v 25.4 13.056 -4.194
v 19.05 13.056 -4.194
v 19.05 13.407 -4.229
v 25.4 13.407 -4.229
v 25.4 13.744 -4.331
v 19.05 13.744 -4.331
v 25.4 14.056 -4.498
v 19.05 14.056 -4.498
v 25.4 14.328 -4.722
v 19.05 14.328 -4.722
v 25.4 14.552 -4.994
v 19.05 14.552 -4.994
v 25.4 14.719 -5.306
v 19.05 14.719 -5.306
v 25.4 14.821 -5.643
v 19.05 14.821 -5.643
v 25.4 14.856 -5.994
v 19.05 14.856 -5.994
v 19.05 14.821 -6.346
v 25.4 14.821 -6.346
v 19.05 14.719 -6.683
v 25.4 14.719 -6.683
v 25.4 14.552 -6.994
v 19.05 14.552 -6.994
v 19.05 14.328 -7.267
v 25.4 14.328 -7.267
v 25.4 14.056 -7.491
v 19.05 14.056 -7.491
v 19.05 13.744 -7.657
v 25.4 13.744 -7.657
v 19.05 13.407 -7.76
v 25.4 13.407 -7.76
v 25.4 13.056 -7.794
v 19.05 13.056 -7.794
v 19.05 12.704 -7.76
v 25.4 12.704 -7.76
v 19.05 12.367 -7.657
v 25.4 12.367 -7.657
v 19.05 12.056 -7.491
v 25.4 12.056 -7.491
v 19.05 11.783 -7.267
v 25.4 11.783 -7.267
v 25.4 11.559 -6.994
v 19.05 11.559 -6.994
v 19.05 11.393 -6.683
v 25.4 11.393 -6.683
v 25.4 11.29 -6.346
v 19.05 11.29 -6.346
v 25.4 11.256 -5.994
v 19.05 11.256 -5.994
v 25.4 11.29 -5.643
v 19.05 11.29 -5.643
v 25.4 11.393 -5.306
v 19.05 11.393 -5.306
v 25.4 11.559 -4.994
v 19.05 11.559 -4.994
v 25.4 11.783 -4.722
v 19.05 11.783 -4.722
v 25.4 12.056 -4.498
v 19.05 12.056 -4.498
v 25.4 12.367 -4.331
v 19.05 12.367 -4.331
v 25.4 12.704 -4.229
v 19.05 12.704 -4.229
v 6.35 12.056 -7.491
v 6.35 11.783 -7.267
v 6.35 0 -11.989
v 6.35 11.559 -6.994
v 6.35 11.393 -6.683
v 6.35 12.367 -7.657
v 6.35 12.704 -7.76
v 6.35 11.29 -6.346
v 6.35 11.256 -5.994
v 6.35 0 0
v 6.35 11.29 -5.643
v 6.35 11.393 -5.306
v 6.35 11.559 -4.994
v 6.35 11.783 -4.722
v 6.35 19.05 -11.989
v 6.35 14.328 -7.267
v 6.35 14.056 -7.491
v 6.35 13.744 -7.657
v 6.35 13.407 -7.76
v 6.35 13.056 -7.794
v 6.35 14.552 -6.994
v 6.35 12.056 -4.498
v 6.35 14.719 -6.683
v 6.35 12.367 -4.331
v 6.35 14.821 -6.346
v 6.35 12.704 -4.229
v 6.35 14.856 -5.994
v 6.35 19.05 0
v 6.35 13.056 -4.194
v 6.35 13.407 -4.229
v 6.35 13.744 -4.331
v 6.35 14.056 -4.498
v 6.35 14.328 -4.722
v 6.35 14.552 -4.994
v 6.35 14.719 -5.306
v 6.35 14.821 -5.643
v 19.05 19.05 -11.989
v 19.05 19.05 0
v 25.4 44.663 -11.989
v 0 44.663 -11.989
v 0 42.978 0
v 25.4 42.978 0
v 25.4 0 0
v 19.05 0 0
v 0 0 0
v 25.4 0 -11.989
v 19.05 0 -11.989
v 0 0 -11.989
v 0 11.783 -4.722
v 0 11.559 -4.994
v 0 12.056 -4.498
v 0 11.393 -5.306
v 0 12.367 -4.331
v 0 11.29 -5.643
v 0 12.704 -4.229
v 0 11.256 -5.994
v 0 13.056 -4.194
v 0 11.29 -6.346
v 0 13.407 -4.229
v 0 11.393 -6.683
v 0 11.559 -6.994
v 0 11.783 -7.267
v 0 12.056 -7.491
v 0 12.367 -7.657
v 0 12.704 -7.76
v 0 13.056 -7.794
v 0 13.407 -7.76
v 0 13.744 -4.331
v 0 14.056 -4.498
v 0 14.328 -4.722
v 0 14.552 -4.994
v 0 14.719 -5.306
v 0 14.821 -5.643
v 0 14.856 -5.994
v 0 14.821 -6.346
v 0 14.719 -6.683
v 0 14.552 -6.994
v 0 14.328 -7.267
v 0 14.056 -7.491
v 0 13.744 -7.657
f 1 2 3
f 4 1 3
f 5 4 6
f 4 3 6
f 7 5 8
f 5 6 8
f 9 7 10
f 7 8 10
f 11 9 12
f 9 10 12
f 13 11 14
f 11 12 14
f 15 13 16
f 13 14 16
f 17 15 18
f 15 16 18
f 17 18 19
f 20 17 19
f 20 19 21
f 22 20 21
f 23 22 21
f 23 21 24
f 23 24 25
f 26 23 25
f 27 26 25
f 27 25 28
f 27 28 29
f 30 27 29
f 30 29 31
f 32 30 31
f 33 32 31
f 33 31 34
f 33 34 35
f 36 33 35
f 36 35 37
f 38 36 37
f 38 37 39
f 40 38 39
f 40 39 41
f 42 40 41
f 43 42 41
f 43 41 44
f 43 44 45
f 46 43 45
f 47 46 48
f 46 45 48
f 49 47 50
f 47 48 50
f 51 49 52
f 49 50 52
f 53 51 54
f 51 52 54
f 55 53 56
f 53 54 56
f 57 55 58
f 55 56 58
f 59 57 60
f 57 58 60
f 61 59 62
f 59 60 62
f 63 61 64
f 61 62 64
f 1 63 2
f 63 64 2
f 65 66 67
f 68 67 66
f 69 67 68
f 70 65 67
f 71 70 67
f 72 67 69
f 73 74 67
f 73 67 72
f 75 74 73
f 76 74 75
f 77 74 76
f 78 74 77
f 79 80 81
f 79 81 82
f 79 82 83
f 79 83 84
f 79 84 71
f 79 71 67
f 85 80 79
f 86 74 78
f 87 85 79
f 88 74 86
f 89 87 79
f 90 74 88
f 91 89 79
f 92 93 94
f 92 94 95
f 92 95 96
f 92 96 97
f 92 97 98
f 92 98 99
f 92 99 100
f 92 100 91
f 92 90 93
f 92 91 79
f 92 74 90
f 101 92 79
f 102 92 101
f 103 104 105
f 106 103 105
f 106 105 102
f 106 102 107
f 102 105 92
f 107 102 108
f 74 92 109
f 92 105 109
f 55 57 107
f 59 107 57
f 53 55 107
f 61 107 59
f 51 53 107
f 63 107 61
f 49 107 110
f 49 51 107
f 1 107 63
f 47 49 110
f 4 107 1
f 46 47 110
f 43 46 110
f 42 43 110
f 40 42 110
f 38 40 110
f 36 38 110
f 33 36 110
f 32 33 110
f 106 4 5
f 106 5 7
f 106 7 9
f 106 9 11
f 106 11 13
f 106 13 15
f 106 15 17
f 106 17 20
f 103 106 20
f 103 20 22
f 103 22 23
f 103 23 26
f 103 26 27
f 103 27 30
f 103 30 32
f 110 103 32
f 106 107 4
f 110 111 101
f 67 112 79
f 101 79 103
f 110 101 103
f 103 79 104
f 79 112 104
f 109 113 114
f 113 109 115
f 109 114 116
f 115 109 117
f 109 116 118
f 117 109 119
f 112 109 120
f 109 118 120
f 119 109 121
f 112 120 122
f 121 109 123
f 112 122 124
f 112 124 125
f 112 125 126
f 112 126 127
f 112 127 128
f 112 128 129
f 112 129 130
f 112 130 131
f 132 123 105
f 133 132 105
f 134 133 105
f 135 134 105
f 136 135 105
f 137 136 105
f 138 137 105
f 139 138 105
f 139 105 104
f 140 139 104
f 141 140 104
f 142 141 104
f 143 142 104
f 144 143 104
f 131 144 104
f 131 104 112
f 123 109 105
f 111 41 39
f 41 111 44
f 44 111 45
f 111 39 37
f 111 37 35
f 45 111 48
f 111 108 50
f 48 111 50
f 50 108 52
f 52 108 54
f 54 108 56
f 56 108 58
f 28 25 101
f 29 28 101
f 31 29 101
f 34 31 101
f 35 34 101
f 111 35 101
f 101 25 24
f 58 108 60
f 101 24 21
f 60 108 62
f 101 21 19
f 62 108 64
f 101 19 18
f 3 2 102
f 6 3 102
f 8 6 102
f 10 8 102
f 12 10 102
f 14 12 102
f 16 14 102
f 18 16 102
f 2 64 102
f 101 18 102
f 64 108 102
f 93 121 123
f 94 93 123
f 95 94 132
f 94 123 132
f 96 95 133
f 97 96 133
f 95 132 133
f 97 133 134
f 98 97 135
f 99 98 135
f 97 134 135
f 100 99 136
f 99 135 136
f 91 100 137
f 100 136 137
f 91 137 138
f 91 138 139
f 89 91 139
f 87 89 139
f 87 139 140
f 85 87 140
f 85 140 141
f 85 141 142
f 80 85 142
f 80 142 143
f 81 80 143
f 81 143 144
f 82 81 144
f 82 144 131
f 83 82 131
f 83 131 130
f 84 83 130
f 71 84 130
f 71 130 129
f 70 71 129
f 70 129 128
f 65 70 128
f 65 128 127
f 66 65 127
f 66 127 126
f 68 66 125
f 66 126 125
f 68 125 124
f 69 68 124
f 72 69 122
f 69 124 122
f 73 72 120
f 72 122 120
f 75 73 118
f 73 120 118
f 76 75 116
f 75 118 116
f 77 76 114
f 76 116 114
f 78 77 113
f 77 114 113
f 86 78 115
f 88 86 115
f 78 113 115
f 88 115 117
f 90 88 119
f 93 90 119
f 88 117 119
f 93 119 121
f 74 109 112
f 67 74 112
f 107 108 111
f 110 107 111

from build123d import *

# Parameters (mm, degrees)
BOSS_EXTRUDE1_DEPTH  = 25.4
SKETCH2_W            = 12.7
SKETCH2_H            = 19.05
CUT_EXTRUDE1_DEPTH   = 53.76066686
M3_CLEARANCE_HOLE1_D = 3.6


with BuildPart() as part:
    # Sketch1 → Boss-Extrude1 (new body)
    with BuildSketch(Plane(origin=(0, 0, 0), x_dir=(0, 0, -1), z_dir=(1, 0, 0))):
        Polygon((0, 0), (11.9888, 0), (11.9888, 44.663146352), (0, 42.978230393), align=None)
    extrude(amount=BOSS_EXTRUDE1_DEPTH)

    # Sketch2 → Cut-Extrude1 (cut, through all)
    with BuildSketch(Plane.XY):
        with Locations((12.7, 9.525)):
            Rectangle(SKETCH2_W, SKETCH2_H)
    extrude(amount=-CUT_EXTRUDE1_DEPTH, mode=Mode.SUBTRACT)

    # M3 Clearance Hole1 (through all)
    with Locations(Plane(origin=(25.4, 0, 0), x_dir=(0, 0, -1), z_dir=(1, 0, 0))):
        with Locations((5.9944, 13.0556)):
            Hole(M3_CLEARANCE_HOLE1_D / 2)


solid = part.part
